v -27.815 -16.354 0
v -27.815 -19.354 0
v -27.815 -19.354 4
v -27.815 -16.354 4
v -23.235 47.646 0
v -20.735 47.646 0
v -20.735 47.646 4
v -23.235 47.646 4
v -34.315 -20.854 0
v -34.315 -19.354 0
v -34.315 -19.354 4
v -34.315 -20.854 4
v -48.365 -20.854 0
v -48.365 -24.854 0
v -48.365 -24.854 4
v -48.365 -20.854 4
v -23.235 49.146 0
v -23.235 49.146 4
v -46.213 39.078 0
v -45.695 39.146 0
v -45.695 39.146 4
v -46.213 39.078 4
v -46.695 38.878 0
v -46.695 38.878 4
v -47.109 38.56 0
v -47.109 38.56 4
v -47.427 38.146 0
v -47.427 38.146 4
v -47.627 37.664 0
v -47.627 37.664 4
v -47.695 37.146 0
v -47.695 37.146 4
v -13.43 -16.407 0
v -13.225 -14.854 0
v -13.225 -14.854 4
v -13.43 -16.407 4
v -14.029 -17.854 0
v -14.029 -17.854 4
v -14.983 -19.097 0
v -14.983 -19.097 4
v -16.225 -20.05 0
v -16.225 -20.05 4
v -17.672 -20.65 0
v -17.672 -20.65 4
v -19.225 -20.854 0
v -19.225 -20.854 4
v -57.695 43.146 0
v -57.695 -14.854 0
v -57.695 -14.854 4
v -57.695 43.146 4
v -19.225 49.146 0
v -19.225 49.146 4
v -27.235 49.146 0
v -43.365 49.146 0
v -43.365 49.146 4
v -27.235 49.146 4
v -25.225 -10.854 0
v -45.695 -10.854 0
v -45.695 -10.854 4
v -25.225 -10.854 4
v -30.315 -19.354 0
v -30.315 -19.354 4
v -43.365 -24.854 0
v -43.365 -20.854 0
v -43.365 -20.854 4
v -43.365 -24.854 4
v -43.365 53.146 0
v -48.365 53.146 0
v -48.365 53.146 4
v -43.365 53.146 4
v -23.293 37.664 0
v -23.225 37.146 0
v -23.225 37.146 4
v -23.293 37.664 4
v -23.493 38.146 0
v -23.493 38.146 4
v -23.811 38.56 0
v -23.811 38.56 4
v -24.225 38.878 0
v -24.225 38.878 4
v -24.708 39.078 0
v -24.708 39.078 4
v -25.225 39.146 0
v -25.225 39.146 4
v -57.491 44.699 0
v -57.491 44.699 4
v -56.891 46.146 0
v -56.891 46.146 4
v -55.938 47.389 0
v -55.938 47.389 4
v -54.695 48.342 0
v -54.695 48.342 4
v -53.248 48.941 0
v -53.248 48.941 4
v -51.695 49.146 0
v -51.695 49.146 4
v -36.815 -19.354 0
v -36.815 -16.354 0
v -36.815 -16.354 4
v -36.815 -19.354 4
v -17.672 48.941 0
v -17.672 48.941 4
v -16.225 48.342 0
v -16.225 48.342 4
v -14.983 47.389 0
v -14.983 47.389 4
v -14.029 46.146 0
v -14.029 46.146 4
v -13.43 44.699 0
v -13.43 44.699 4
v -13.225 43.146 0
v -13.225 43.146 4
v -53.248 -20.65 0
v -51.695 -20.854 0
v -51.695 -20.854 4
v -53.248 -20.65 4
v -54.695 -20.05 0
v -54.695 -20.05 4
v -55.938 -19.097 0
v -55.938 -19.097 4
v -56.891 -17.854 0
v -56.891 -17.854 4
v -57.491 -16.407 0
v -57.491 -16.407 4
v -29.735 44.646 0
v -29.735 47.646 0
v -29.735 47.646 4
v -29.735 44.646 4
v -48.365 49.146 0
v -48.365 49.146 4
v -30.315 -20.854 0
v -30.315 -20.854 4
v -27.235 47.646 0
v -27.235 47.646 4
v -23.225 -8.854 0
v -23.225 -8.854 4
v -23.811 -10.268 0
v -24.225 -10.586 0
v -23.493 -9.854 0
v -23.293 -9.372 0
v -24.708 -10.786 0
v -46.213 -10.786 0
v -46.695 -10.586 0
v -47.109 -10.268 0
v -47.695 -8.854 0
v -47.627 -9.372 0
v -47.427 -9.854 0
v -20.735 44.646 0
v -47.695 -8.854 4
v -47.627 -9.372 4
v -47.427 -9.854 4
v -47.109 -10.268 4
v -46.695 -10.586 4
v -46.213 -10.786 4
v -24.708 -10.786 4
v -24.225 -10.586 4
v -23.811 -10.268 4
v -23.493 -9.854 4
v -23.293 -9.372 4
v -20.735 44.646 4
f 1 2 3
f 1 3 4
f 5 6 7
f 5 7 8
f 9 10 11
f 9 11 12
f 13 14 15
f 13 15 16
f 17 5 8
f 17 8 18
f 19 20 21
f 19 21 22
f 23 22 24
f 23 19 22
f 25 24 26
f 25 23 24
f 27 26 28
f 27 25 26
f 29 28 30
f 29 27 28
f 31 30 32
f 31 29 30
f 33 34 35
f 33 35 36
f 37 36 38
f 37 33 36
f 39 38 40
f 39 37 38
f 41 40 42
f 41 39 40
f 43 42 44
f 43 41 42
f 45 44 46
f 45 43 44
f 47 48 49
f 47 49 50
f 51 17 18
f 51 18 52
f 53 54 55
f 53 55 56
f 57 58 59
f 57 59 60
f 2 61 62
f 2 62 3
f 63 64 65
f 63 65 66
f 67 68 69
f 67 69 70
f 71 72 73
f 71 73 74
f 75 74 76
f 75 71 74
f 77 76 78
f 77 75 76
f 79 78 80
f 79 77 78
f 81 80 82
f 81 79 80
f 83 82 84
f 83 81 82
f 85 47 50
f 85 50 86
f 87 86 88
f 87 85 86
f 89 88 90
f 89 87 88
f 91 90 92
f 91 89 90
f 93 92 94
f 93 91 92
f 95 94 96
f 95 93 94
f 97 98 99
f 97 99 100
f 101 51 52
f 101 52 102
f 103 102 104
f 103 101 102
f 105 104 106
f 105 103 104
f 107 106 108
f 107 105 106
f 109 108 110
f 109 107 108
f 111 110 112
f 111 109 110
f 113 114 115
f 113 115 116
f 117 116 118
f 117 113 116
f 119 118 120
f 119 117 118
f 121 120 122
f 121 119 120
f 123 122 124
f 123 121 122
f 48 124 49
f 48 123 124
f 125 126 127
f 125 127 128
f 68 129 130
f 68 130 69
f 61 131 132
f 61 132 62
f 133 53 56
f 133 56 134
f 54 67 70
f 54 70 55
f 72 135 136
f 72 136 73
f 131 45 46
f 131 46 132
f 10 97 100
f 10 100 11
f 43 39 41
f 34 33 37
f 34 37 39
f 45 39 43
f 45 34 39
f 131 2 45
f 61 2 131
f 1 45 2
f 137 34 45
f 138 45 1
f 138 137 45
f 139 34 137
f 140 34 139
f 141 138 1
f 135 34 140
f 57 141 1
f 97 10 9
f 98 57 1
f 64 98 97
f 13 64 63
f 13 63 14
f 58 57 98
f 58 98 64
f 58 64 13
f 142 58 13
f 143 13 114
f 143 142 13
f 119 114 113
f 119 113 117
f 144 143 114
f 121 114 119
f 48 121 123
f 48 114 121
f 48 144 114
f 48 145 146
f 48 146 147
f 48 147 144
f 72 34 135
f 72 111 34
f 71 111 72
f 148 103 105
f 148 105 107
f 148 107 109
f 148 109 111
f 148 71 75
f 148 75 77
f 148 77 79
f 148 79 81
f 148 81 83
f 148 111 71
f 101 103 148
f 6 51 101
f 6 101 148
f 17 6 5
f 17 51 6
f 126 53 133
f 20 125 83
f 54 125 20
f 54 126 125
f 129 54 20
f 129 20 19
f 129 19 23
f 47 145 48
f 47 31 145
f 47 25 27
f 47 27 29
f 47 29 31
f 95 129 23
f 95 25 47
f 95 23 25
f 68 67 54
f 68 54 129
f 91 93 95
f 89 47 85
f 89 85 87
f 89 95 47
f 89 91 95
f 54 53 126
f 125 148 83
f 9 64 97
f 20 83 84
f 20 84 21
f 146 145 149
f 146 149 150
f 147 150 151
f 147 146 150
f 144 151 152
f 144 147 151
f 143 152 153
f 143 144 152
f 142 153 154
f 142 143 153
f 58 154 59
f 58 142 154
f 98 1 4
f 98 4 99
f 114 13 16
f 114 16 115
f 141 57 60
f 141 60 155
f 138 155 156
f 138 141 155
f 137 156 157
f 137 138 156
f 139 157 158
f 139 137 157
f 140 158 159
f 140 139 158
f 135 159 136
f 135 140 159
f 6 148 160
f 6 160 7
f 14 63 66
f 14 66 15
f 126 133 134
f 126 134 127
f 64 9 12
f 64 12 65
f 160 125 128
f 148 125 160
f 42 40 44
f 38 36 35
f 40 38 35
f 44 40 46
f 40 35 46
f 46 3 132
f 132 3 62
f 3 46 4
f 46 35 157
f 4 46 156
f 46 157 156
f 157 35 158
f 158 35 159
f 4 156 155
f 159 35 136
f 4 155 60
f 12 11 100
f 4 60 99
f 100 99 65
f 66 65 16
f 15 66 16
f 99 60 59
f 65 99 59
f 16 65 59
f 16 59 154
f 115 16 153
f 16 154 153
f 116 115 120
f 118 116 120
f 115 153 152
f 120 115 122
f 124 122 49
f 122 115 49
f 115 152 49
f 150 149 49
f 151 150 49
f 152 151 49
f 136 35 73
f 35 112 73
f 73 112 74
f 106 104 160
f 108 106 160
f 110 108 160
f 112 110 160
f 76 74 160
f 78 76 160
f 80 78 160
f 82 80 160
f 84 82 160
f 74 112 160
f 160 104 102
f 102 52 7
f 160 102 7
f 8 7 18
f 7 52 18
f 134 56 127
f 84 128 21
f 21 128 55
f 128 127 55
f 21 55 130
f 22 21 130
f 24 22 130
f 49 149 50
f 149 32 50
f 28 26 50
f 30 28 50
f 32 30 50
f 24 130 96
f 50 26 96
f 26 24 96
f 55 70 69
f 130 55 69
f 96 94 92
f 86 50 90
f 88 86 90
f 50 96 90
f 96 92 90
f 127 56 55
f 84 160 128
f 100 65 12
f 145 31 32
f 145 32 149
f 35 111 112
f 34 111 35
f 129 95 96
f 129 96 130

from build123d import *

# Parameters (mm, degrees)
SALIENTE_EXTRUIR1_DEPTH = 4


with BuildPart() as part:
    # Croquis1 → Saliente-Extruir1 (new body)
    with BuildSketch(Plane.XY):
        with BuildLine():
            Line((-48.365211809, -20.854133368), (-51.695211809, -20.854133368))
            ThreePointArc((-51.695211809, -20.854133368), (-55.937852496, -19.096774055), (-57.695211809, -14.854133368))
            Line((-57.695211809, -14.854133368), (-57.695211809, 43.145866632))
            ThreePointArc((-57.695211809, 43.145866632), (-55.937852496, 47.388507319), (-51.695211809, 49.145866632))
            Line((-51.695211809, 49.145866632), (-48.365211809, 49.145866632))
            Line((-48.365211809, 49.145866632), (-48.365211809, 53.145866632))
            Line((-48.365211809, 53.145866632), (-43.365211809, 53.145866632))
            Line((-43.365211809, 53.145866632), (-43.365211809, 49.145866632))
            Line((-43.365211809, 49.145866632), (-27.235211809, 49.145866632))
            Line((-27.235211809, 49.145866632), (-27.235211809, 47.645866632))
            Line((-27.235211809, 47.645866632), (-29.735211809, 47.645866632))
            Line((-29.735211809, 47.645866632), (-29.735211809, 44.645866632))
            Line((-29.735211809, 44.645866632), (-20.735211809, 44.645866632))
            Line((-20.735211809, 44.645866632), (-20.735211809, 47.645866632))
            Line((-20.735211809, 47.645866632), (-23.235211809, 47.645866632))
            Line((-23.235211809, 47.645866632), (-23.235211809, 49.145866632))
            Line((-23.235211809, 49.145866632), (-19.225211809, 49.145866632))
            ThreePointArc((-19.225211809, 49.145866632), (-14.982571122, 47.388507319), (-13.225211809, 43.145866632))
            Line((-13.225211809, 43.145866632), (-13.225211809, -14.854133368))
            ThreePointArc((-13.225211809, -14.854133368), (-14.982571122, -19.096774055), (-19.225211809, -20.854133368))
            Line((-19.225211809, -20.854133368), (-30.315211809, -20.854133368))
            Line((-30.315211809, -20.854133368), (-30.315211809, -19.354133368))
            Line((-30.315211809, -19.354133368), (-27.815211809, -19.354133368))
            Line((-27.815211809, -19.354133368), (-27.815211809, -16.354133368))
            Line((-27.815211809, -16.354133368), (-36.815211809, -16.354133368))
            Line((-36.815211809, -16.354133368), (-36.815211809, -19.354133368))
            Line((-36.815211809, -19.354133368), (-34.315211809, -19.354133368))
            Line((-34.315211809, -19.354133368), (-34.315211809, -20.854133368))
            Line((-34.315211809, -20.854133368), (-43.365211809, -20.854133368))
            Line((-43.365211809, -20.854133368), (-43.365211809, -24.854133368))
            Line((-43.365211809, -24.854133368), (-48.365211809, -24.854133368))
            Line((-48.365211809, -24.854133368), (-48.365211809, -20.854133368))
        make_face()
        with BuildLine():
            Line((-47.695211809, 14.145866632), (-47.695211809, -8.854133368))
            ThreePointArc((-47.695211809, -8.854133368), (-47.109425371, -10.26834693), (-45.695211809, -10.854133368))
            Line((-45.695211809, -10.854133368), (-25.225211809, -10.854133368))
            ThreePointArc((-25.225211809, -10.854133368), (-23.810998246, -10.26834693), (-23.225211809, -8.854133368))
            Line((-23.225211809, -8.854133368), (-23.225211809, 37.145866632))
            ThreePointArc((-23.225211809, 37.145866632), (-23.810998246, 38.560080194), (-25.225211809, 39.145866632))
            Line((-25.225211809, 39.145866632), (-45.695211809, 39.145866632))
            ThreePointArc((-45.695211809, 39.145866632), (-47.109425371, 38.560080194), (-47.695211809, 37.145866632))
            Line((-47.695211809, 37.145866632), (-47.695211809, 14.145866632))
        make_face(mode=Mode.SUBTRACT)
    extrude(amount=SALIENTE_EXTRUIR1_DEPTH)


solid = part.part
